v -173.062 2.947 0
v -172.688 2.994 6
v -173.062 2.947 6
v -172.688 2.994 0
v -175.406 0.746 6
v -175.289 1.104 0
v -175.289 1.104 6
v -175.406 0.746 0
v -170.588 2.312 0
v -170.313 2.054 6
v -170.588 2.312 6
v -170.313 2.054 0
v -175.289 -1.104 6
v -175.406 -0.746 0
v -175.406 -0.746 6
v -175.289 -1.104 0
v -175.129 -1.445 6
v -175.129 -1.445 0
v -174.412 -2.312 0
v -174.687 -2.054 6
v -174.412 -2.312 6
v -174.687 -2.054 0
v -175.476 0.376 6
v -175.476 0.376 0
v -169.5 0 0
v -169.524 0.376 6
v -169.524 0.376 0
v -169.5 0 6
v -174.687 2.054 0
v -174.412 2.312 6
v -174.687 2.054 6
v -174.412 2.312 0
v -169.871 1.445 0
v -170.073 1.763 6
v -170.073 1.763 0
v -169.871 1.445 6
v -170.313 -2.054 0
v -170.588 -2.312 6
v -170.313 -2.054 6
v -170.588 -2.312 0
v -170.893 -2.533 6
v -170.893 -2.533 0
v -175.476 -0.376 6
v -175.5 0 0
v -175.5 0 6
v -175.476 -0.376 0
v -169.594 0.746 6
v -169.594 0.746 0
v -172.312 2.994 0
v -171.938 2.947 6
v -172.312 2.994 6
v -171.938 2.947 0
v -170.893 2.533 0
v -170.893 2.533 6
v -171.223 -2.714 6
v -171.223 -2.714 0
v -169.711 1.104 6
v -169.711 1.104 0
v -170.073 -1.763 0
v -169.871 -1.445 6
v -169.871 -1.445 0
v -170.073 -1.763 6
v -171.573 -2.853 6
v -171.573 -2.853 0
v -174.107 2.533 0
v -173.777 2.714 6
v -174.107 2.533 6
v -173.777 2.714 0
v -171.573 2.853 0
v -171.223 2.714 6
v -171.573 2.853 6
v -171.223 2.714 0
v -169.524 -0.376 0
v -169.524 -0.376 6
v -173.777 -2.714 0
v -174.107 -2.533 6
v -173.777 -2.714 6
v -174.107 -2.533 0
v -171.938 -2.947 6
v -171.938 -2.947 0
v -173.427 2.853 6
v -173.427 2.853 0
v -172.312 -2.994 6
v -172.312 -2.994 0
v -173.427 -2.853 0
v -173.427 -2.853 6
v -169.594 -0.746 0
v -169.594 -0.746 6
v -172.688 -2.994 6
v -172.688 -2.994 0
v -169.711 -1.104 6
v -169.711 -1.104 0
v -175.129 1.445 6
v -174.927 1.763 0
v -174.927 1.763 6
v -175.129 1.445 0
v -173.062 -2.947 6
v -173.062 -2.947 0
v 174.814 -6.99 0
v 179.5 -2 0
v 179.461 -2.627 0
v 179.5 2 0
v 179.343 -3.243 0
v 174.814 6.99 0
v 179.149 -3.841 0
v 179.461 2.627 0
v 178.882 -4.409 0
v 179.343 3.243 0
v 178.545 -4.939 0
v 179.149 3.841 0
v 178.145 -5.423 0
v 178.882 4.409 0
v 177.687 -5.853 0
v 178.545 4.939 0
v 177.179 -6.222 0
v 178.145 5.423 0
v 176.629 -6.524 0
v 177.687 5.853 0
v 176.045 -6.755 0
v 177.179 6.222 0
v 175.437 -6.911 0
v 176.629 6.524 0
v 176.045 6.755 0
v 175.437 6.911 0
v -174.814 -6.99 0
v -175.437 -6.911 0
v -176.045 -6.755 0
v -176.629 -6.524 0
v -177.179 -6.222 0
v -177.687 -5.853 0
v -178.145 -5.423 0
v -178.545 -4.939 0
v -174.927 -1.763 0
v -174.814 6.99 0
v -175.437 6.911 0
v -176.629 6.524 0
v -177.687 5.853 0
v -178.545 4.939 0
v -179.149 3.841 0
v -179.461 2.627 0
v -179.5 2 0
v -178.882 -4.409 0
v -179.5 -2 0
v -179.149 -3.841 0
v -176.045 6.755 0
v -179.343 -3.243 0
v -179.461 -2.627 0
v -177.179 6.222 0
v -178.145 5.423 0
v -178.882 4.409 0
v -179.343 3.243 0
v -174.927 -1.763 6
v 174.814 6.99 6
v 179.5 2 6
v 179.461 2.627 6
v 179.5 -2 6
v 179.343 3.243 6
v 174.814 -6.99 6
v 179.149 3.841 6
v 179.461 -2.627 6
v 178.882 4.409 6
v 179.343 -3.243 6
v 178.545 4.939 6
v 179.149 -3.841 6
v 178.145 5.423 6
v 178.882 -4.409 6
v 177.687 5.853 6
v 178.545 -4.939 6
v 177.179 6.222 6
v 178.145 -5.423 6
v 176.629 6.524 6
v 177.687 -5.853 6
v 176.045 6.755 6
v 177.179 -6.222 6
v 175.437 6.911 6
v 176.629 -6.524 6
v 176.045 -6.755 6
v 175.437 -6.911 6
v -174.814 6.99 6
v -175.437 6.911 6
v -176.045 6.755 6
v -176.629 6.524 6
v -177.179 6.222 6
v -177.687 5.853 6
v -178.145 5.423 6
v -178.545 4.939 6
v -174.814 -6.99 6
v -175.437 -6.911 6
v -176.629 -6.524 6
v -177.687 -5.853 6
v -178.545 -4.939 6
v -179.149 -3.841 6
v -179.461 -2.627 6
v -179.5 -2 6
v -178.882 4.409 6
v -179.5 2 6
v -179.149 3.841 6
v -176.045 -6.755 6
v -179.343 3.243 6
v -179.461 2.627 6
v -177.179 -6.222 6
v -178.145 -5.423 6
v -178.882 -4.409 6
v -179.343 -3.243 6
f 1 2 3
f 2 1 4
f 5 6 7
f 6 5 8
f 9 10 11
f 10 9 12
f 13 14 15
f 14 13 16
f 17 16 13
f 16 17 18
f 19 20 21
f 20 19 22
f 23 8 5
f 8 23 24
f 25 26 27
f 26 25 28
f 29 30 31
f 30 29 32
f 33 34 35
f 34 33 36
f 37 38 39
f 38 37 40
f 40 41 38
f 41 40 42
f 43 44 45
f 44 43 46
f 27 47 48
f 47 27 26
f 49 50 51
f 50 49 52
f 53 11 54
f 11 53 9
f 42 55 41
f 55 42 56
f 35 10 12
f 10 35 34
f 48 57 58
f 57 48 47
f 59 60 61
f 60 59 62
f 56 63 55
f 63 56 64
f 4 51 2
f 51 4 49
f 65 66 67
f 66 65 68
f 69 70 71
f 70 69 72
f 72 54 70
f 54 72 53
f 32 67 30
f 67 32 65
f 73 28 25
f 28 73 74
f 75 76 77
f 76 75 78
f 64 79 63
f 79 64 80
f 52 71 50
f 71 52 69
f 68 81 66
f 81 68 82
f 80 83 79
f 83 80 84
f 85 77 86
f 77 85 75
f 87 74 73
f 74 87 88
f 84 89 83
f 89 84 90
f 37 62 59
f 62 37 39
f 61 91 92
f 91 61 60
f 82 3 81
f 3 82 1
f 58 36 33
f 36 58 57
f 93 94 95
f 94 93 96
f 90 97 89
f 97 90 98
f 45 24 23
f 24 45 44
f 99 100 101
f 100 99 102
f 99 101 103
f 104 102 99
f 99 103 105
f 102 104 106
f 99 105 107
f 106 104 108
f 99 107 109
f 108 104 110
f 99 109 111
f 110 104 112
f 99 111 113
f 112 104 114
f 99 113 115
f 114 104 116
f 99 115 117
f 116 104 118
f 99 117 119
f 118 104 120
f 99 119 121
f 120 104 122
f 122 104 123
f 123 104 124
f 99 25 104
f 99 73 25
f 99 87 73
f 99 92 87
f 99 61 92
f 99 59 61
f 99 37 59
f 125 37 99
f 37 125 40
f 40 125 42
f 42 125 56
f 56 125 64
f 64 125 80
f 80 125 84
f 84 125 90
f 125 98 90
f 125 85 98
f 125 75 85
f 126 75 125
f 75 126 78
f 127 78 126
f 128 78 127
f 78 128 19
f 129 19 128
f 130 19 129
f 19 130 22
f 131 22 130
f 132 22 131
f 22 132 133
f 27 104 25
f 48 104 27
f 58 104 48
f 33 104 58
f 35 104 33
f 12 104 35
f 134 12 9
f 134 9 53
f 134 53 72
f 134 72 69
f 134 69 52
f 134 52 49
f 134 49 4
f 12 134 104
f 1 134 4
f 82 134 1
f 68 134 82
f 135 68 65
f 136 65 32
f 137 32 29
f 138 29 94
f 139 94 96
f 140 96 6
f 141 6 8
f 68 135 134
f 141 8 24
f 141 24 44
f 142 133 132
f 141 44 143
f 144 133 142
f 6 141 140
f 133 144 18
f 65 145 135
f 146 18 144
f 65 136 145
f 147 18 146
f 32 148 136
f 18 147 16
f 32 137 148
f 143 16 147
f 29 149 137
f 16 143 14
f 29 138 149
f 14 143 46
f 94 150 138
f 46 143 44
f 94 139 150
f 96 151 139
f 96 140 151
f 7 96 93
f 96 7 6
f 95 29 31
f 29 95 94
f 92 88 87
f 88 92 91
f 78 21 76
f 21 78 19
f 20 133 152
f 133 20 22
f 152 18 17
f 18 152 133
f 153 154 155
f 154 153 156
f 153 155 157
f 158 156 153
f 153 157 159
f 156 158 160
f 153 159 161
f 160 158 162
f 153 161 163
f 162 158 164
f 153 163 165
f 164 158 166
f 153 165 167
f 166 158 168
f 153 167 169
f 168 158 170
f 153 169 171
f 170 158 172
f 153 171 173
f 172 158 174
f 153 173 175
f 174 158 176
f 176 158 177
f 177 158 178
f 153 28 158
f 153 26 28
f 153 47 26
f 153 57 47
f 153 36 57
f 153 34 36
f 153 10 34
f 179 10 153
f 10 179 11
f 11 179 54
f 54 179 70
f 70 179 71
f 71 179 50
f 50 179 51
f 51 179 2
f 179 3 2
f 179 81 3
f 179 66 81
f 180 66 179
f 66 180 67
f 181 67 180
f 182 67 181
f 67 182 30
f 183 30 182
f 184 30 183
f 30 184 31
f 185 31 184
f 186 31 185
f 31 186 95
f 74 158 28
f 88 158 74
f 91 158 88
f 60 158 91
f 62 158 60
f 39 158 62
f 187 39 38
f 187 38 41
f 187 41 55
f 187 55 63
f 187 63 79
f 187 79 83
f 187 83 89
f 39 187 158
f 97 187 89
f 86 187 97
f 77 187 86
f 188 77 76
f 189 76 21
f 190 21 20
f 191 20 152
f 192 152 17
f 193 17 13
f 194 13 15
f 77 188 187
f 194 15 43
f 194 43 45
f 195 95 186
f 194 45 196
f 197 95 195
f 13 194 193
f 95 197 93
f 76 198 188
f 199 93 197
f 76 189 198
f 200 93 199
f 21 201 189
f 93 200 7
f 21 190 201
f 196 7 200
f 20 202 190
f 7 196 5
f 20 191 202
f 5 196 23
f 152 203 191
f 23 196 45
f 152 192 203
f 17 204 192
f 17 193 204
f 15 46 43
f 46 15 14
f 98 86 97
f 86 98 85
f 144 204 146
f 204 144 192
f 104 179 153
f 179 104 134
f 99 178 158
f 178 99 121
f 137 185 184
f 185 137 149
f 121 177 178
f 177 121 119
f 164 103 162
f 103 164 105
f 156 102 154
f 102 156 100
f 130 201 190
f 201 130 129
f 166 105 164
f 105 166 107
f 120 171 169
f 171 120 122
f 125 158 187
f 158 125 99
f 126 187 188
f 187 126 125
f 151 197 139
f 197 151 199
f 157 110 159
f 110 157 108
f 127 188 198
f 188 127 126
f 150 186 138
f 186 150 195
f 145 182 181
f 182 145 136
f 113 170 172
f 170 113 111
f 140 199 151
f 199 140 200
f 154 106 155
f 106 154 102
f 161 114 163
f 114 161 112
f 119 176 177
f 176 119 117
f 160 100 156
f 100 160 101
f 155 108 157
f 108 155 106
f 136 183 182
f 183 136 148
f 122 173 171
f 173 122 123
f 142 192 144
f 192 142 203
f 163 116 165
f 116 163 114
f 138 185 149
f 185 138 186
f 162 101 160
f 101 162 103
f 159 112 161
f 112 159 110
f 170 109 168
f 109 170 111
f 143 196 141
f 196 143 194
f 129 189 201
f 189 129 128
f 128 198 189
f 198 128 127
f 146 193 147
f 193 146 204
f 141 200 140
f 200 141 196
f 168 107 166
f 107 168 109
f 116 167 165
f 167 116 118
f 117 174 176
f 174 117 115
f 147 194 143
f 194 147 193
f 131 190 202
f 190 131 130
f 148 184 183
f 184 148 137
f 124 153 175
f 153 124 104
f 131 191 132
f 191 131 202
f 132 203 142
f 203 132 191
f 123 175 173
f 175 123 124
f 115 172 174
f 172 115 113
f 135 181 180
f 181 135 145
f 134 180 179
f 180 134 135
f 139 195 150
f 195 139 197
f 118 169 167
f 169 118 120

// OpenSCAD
$fn = 50;


difference() {
	union() {
		hull() {
			translate(v = [-174.5000000000, 2.0000000000, 0]) {
				cylinder(h = 6, r = 5);
			}
			translate(v = [174.5000000000, 2.0000000000, 0]) {
				cylinder(h = 6, r = 5);
			}
			translate(v = [-174.5000000000, -2.0000000000, 0]) {
				cylinder(h = 6, r = 5);
			}
			translate(v = [174.5000000000, -2.0000000000, 0]) {
				cylinder(h = 6, r = 5);
			}
		}
	}
	union() {
		translate(v = [-172.5000000000, 0.0000000000, 0]) {
			cylinder(h = 6, r = 3.0000000000);
		}
		translate(v = [-172.5000000000, 0.0000000000, 0]) {
			cylinder(h = 6, r = 1.5000000000);
		}
		translate(v = [-172.5000000000, 0.0000000000, 0]) {
			cylinder(h = 6, r = 1.5000000000);
		}
		translate(v = [-172.5000000000, 0.0000000000, 0]) {
			cylinder(h = 6, r = 1.5000000000);
		}
	}
}
